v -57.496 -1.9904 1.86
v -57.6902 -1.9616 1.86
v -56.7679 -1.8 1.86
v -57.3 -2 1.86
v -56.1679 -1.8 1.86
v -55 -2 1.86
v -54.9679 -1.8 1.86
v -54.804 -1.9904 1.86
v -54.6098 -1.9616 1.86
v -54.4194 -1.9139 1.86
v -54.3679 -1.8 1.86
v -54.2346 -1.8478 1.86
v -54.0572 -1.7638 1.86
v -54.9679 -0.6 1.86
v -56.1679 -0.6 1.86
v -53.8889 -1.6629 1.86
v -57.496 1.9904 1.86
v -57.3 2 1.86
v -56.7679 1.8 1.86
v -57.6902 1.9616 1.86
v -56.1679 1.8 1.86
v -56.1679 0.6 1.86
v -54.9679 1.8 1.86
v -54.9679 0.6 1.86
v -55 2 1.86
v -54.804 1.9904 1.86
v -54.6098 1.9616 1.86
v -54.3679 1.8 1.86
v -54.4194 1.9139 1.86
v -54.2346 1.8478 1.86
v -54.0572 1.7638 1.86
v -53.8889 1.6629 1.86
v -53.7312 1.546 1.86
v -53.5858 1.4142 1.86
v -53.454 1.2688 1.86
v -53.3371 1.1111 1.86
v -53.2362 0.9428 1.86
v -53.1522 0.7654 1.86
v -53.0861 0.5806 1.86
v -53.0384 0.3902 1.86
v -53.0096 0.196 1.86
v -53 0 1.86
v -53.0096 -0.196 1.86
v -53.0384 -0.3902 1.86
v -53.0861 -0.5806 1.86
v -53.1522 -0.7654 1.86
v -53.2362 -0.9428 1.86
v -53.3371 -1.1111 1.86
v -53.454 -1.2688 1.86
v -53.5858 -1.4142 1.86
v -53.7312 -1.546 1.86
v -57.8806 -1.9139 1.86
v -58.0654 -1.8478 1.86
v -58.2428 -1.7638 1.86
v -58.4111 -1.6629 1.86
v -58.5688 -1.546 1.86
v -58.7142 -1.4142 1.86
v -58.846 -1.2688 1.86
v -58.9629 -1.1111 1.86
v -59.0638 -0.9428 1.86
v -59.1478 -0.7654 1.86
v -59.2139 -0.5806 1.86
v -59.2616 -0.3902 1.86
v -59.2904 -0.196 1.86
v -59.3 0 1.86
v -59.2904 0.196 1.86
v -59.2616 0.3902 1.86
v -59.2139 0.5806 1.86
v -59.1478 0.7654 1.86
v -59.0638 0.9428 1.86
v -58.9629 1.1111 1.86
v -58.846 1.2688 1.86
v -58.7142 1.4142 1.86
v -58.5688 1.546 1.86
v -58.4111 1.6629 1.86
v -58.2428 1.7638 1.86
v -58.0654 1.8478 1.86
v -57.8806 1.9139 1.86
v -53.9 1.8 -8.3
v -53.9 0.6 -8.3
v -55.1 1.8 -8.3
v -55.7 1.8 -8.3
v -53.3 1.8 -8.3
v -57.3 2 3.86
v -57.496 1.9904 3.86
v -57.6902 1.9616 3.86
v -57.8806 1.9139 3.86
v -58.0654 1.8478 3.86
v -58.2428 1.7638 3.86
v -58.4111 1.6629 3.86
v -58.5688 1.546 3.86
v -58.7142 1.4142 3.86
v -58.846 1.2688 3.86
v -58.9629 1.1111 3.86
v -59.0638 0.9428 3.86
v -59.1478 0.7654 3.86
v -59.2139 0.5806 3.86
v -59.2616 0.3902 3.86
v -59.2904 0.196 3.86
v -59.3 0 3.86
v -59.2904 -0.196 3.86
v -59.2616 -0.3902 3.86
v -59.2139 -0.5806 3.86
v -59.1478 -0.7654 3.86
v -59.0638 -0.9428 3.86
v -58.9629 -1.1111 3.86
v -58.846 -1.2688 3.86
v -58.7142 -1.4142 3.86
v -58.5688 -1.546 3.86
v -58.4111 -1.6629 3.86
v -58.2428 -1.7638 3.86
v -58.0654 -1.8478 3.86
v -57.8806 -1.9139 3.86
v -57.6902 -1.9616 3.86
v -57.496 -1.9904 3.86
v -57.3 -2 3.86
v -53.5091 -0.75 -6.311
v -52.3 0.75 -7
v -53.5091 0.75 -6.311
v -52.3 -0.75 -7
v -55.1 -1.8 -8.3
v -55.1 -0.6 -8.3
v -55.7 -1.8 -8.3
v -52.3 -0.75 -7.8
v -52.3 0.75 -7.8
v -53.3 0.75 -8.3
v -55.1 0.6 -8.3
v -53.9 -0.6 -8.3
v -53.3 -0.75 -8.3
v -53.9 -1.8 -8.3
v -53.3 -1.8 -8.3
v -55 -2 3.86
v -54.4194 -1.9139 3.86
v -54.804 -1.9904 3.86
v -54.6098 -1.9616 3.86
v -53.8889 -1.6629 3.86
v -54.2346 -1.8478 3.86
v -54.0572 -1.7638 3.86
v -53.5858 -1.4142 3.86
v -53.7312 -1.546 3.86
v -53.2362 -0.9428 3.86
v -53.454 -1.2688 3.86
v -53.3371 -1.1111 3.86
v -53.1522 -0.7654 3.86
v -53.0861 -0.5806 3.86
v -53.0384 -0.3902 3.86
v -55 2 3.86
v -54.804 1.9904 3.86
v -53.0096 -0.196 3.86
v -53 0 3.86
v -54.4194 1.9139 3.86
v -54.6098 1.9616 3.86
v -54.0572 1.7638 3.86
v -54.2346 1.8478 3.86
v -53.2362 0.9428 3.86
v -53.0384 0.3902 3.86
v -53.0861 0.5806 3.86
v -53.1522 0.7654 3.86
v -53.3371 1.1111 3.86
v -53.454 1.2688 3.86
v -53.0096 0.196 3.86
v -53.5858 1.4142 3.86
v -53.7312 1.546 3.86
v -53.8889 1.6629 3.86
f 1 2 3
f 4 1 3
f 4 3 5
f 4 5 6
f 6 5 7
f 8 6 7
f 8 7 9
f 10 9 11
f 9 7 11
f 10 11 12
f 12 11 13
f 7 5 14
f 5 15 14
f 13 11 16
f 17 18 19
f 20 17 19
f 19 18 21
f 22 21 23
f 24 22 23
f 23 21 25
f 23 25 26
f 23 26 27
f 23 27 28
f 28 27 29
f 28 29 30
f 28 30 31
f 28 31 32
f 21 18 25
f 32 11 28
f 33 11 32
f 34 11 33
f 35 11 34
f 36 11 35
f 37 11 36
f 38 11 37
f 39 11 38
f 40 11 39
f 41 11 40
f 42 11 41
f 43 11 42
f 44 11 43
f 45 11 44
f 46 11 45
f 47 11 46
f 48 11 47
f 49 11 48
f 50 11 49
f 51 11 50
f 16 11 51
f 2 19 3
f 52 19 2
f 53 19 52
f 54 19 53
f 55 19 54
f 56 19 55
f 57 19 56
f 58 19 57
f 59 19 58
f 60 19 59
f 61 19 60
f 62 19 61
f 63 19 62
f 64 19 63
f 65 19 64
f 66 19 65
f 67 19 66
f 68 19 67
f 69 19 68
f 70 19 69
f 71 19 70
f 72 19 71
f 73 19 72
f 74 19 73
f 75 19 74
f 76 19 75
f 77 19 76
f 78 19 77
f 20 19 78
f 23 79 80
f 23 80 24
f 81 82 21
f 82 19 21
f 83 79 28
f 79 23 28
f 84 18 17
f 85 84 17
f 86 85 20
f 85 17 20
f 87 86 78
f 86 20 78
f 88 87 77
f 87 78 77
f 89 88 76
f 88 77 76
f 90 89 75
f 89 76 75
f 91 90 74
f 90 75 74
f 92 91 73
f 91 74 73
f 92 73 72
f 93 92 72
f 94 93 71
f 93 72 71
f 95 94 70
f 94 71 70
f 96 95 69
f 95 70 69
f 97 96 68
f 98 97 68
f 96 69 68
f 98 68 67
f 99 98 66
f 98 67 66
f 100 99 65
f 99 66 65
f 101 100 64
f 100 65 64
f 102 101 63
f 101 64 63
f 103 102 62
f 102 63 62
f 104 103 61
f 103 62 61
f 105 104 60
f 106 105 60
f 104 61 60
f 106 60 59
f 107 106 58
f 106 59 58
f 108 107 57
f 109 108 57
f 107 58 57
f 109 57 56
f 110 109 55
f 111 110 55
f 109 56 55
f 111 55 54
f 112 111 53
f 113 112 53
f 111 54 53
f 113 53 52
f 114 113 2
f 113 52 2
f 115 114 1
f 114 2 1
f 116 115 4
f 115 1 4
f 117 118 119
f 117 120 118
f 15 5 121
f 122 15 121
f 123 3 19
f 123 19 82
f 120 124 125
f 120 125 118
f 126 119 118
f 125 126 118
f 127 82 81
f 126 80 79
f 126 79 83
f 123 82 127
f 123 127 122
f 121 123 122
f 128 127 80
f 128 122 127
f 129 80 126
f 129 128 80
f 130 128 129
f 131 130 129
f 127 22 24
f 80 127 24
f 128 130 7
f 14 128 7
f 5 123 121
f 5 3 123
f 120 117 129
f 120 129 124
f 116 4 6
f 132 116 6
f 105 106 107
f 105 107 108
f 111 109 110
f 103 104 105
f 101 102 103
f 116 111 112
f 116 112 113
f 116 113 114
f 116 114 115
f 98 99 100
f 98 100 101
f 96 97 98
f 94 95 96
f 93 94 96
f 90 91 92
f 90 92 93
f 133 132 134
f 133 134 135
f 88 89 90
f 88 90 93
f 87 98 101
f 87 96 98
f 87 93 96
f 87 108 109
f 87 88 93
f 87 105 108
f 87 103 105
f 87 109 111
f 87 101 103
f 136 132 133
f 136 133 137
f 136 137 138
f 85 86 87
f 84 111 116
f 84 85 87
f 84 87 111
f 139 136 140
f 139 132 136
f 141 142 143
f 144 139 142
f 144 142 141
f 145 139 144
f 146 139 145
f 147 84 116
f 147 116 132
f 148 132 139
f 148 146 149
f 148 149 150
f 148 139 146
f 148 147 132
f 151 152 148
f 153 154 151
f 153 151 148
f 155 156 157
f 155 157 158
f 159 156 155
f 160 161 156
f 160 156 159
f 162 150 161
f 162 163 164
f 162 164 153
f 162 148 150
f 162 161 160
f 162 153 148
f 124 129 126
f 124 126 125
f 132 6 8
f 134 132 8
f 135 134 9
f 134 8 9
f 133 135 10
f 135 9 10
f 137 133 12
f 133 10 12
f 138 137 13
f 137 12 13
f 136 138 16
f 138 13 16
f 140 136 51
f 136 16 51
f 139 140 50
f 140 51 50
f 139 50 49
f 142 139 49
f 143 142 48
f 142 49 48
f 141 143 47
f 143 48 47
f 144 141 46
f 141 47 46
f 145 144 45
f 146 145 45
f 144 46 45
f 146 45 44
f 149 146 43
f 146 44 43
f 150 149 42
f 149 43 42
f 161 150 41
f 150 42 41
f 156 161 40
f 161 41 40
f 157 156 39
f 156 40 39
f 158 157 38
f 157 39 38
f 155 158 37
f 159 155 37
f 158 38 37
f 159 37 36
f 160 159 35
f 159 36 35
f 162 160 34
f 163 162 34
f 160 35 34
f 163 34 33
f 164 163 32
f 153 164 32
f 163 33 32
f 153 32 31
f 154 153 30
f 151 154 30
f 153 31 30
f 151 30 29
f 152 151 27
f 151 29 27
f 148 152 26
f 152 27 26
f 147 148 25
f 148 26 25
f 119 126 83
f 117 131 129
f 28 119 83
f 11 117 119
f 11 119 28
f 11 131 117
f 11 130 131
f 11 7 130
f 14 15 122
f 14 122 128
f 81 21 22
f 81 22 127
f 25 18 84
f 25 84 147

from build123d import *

# Parameters (mm, degrees)
PAD005_DEPTH    = 1.8
POCKET004_DEPTH = 1.2
PAD007_DEPTH    = 2
PAD011_DEPTH    = 0.75


with BuildPart() as part:
    # Sketch008 → Pad005 (new body, symmetric)
    with BuildSketch(Plane.XZ):
        Polygon((-53.3, -8.3), (-54.367859, 1.86), (-56.767859, 1.86), (-55.7, -8.3), align=None)
    extrude(amount=PAD005_DEPTH, both=True)

    # Sketch010 (on DatumPlane) → Pocket004 (cut)
    with BuildSketch(Plane.XZ.offset(1.8)):
        Polygon((-53.9, -8.3), (-54.967859, 1.86), (-56.167859, 1.86), (-55.1, -8.3), align=None)
    pocket004 = extrude(amount=-POCKET004_DEPTH, mode=Mode.SUBTRACT)

    # Mirrored002: Pocket004 across XZ
    add(pocket004.mirror(Plane.XZ), mode=Mode.SUBTRACT)

    # Sketch014 (on DatumPlane) → Pad007 (join)
    with BuildSketch(Plane.XY.offset(1.86)):
        with BuildLine():
            ThreePointArc((-57.3, 2), (-59.3, 0), (-57.3, -2))
            Line((-57.3, -2), (-55, -2))
            ThreePointArc((-55, -2), (-53, 0), (-55, 2))
            Line((-57.3, 2), (-55, 2))
        make_face()
    extrude(amount=PAD007_DEPTH)

    # Sketch023 → Pad011 (join, symmetric)
    with BuildSketch(Plane.XZ):
        Polygon((-53.509057, -6.310956), (-53.3, -8.3), (-52.3, -7.8), (-52.3, -7), align=None)
    extrude(amount=PAD011_DEPTH, both=True)


solid = part.part
